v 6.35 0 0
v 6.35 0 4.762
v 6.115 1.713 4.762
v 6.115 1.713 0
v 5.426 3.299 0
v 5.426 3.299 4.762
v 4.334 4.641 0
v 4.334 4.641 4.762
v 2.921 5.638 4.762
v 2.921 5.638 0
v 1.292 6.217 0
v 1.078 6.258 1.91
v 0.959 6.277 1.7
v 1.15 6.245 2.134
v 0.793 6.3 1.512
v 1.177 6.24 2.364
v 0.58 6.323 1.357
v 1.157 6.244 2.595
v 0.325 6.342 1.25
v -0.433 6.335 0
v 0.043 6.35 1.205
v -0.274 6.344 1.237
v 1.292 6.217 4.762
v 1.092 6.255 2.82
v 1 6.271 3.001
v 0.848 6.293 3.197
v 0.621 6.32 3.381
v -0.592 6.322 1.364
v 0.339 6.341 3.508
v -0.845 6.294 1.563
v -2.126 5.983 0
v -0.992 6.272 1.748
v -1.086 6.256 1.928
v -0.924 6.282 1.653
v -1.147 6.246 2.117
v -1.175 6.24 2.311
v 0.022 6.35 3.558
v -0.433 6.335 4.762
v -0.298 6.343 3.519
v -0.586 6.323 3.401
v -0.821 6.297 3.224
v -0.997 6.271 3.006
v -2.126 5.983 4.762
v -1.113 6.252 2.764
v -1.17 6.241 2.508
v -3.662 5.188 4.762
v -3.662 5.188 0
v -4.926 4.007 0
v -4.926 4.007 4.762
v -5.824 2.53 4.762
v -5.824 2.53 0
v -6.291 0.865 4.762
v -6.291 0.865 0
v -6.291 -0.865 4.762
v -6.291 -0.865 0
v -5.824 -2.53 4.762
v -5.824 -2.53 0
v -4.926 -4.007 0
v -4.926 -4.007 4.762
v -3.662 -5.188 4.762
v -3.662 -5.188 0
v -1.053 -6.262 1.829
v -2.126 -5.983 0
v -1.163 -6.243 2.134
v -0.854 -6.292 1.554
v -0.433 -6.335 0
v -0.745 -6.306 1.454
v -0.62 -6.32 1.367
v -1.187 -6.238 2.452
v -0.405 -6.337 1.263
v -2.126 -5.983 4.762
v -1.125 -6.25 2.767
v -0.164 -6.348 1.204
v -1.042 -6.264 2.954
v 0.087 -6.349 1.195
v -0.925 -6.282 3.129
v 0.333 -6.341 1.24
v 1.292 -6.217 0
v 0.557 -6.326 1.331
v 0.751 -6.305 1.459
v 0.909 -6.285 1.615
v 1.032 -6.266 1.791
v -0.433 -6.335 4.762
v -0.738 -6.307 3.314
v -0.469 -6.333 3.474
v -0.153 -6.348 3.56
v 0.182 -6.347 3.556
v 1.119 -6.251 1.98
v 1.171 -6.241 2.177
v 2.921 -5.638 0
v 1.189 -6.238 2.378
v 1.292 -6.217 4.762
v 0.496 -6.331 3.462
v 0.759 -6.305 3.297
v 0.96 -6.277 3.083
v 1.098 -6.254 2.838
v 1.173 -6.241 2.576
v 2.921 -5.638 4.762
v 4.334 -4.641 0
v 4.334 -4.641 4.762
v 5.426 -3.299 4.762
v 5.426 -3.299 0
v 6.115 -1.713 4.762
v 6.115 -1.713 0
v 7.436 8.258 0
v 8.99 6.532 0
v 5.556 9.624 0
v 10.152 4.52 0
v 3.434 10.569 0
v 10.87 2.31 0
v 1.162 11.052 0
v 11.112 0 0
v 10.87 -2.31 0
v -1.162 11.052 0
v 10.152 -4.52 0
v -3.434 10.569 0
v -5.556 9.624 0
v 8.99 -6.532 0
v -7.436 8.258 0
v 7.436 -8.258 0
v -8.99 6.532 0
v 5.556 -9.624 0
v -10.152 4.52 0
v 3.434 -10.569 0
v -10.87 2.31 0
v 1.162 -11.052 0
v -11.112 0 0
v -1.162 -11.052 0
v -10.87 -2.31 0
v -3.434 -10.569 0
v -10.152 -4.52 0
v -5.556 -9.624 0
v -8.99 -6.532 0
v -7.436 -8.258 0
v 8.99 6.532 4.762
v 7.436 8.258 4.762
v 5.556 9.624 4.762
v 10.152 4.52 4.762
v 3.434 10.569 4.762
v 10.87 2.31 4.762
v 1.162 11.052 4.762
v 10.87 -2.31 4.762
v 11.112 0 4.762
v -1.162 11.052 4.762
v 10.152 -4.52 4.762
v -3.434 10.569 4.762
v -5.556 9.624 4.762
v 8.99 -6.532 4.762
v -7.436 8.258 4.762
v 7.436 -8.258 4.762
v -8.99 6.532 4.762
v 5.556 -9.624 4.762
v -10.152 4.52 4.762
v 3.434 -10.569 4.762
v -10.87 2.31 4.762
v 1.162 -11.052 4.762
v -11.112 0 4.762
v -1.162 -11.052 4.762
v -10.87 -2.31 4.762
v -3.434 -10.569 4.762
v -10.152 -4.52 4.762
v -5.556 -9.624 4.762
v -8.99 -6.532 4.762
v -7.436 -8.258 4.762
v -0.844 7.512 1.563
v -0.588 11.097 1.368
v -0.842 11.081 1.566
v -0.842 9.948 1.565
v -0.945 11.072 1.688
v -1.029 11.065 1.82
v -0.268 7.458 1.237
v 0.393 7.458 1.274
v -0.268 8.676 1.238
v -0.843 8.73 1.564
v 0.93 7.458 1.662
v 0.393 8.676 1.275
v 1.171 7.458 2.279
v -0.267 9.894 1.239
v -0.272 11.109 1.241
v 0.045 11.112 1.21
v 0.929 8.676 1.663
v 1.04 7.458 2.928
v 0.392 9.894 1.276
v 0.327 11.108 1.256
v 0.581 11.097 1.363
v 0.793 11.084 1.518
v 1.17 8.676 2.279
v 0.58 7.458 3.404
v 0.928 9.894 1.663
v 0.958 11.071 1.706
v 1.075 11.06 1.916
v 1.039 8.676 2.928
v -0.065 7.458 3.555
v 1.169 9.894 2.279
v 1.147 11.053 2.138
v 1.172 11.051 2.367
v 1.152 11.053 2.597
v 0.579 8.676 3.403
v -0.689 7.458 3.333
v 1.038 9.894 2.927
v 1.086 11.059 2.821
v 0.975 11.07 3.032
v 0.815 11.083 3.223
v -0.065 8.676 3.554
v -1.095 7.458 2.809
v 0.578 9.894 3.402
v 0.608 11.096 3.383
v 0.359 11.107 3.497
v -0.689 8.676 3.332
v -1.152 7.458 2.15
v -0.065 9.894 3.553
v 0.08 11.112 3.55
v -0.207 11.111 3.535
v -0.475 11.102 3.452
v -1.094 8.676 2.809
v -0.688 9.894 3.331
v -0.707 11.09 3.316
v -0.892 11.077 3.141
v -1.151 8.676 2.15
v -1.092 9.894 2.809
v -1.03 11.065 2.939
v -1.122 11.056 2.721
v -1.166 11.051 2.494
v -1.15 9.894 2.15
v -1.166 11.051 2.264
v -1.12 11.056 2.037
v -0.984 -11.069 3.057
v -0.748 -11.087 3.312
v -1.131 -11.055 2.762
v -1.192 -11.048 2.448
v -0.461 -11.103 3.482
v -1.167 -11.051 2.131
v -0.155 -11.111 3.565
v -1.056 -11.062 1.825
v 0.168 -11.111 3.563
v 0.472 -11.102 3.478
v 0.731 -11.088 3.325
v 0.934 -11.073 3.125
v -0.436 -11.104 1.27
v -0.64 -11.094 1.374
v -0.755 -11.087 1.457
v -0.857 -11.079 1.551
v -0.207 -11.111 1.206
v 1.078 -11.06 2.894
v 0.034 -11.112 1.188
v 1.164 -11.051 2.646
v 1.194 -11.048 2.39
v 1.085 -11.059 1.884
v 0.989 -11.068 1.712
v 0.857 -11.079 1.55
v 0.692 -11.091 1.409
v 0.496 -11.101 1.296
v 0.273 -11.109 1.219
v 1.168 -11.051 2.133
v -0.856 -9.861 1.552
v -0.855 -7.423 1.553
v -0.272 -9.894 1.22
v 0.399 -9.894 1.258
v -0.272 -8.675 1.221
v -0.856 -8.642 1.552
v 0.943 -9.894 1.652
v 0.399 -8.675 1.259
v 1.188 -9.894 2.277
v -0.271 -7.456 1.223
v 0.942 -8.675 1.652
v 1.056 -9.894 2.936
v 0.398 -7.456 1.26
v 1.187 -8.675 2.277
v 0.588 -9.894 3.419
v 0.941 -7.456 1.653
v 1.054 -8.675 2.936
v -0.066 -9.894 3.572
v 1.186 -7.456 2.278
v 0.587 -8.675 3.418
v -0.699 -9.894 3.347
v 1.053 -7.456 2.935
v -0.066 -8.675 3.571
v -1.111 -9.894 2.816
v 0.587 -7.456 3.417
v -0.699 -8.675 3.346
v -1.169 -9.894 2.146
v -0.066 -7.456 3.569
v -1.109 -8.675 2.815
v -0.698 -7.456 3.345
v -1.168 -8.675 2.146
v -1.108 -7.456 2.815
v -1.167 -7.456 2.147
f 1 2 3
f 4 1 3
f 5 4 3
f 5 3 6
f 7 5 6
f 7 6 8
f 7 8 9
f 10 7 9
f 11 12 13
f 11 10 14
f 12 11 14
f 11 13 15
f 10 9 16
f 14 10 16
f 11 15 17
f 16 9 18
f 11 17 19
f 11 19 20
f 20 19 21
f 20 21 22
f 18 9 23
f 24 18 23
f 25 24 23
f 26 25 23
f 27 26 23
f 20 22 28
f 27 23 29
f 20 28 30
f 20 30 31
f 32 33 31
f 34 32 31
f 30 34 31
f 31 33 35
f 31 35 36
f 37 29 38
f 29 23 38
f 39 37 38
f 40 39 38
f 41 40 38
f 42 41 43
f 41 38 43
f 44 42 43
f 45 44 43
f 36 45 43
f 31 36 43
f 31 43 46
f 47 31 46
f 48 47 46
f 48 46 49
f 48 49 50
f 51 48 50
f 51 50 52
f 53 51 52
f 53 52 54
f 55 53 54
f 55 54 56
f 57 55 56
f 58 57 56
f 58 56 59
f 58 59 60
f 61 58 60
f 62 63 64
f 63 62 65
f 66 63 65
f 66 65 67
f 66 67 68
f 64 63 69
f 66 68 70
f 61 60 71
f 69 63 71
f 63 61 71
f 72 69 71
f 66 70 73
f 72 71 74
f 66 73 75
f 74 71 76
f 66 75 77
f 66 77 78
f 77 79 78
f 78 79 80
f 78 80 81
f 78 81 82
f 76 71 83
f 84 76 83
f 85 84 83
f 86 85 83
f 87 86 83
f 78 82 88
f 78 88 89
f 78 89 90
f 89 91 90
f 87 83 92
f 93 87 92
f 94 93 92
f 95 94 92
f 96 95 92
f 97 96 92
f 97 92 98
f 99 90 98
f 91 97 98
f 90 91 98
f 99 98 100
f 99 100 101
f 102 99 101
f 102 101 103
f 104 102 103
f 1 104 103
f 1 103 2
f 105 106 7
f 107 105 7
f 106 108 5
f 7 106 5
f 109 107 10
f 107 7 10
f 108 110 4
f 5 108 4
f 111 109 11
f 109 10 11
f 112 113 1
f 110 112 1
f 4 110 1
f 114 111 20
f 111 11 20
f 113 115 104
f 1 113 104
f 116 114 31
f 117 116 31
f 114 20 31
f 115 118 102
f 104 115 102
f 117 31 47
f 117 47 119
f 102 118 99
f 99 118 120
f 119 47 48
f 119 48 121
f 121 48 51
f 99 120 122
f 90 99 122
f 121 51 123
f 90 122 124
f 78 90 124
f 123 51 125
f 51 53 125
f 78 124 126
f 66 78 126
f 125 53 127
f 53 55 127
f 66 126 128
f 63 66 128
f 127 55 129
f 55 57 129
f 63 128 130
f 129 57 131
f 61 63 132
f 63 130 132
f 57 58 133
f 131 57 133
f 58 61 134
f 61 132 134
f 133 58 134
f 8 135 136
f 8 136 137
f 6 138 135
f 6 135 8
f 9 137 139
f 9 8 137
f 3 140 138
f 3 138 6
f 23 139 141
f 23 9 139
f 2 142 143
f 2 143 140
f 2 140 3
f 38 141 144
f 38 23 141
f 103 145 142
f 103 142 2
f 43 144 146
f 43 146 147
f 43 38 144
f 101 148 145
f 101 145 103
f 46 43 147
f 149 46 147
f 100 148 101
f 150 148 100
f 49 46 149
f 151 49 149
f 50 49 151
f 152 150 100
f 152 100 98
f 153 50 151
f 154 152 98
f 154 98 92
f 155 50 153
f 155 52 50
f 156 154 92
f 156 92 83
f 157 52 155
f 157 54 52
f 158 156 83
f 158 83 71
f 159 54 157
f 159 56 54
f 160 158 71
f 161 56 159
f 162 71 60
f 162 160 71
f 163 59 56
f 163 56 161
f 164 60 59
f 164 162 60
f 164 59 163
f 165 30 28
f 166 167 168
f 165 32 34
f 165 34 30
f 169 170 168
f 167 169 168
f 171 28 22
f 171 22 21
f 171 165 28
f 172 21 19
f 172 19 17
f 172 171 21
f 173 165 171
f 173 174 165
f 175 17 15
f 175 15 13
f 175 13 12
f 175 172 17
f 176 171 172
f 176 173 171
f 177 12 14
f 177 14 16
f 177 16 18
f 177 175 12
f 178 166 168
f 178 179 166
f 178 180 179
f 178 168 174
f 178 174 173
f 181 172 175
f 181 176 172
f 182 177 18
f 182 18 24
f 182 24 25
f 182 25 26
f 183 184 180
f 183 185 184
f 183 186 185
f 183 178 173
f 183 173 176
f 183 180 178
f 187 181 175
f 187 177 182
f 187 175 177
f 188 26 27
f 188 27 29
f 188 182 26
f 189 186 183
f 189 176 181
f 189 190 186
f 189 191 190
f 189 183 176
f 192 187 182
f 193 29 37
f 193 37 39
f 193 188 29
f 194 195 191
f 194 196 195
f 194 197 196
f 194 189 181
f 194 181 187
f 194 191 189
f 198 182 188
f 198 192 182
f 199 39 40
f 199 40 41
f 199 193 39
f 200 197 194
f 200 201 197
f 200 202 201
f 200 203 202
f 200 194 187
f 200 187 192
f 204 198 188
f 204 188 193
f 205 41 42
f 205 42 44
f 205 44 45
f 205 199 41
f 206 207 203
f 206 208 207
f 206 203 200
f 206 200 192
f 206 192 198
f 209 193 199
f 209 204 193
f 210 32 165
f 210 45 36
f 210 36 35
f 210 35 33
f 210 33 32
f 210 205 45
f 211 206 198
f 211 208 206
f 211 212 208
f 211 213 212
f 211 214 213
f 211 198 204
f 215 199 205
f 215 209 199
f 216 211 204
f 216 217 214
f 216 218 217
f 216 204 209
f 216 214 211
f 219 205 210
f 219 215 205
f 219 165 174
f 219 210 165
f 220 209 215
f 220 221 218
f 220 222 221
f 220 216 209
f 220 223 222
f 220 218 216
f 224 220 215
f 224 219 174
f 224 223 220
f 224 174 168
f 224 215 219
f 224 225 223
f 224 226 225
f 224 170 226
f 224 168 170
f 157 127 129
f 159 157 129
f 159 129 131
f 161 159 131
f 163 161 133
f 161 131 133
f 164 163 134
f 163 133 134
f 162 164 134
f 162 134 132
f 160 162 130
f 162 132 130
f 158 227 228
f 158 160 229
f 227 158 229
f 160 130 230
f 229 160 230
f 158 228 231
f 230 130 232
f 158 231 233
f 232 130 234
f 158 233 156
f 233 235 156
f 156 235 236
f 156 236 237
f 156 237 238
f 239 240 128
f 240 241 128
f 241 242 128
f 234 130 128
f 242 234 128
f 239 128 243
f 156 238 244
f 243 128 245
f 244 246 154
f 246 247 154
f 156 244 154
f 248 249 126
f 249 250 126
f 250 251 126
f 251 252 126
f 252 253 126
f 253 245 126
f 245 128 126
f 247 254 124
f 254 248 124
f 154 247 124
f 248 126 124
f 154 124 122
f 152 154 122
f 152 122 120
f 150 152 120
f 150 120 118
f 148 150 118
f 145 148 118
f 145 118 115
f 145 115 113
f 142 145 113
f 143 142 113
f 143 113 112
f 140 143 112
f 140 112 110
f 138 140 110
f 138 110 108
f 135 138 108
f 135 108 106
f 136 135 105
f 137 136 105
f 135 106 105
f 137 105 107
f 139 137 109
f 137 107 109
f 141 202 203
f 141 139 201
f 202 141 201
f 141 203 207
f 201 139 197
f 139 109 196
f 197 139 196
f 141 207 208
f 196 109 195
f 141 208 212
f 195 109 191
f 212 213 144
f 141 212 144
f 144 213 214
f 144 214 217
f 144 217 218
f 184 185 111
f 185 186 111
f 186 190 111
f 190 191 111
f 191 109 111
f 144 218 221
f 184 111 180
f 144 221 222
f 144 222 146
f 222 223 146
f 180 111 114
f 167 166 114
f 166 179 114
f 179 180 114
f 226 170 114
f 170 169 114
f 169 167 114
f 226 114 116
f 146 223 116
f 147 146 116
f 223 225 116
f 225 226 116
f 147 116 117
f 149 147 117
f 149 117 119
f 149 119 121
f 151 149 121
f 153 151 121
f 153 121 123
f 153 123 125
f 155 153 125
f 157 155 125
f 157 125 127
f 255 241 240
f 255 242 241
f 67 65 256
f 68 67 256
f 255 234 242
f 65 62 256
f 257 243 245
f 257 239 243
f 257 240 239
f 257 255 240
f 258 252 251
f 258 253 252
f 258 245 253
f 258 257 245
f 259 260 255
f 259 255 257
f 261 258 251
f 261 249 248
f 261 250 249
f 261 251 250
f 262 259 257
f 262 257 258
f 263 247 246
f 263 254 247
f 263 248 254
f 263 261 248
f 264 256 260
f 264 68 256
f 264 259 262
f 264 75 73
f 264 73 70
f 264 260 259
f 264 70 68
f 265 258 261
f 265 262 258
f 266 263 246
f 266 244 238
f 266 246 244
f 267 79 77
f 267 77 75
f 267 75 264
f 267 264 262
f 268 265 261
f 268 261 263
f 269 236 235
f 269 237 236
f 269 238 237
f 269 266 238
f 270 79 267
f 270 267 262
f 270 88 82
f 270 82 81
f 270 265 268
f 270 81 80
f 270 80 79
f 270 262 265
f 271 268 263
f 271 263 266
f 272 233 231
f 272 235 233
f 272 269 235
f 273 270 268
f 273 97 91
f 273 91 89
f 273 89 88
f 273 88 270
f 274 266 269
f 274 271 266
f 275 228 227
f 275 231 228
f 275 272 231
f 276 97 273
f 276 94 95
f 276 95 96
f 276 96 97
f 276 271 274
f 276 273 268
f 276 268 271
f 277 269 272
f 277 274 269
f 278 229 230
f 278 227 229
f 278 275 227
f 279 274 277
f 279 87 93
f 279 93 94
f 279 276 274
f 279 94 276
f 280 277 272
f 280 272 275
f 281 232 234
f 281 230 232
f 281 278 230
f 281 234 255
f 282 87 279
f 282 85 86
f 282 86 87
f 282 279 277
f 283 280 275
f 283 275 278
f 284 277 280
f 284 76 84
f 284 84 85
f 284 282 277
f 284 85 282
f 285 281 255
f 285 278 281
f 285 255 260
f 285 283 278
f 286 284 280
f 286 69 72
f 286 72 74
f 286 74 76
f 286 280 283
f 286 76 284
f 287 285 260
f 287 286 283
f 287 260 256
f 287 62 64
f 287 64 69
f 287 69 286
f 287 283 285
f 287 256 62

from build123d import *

# Parameters (mm, degrees)
SKETCH1_R           = 11.1125
BOSS_EXTRUDE1_DEPTH = 4.7625
SKETCH2_R           = 6.35
CUT_EXTRUDE1_DEPTH  = 17.421227687


with BuildPart() as part:
    # Sketch1 → Boss-Extrude1 (new body)
    with BuildSketch(Plane.XY):
        with Locations(Location((0, 0, 0), (0, 0, 180))):
            Circle(SKETCH1_R)
    extrude(amount=BOSS_EXTRUDE1_DEPTH)

    # Sketch2 → Cut-Extrude1 (cut, through all)
    with BuildSketch(Plane.XY.offset(4.7625)):
        Circle(SKETCH2_R)
    extrude(amount=-CUT_EXTRUDE1_DEPTH, mode=Mode.SUBTRACT)

    # Sketch3 → Cut-Revolve1 (revolve, cut)
    with BuildSketch(Plane.XY.offset(2.38125), mode=Mode.PRIVATE) as cut_revolve1_sk:
        Polygon((1.193659919, -11.1125), (1.171897939, 11.1125), (0, 11.1125), (0, -11.1125), align=None)
    revolve(cut_revolve1_sk.sketch.rotate(Axis((0, 11.1125, 2.38125), (0, -1, 0)), 224.092612296), axis=Axis((0, 11.1125, 2.38125), (0, -1, 0)), mode=Mode.SUBTRACT)


solid = part.part
